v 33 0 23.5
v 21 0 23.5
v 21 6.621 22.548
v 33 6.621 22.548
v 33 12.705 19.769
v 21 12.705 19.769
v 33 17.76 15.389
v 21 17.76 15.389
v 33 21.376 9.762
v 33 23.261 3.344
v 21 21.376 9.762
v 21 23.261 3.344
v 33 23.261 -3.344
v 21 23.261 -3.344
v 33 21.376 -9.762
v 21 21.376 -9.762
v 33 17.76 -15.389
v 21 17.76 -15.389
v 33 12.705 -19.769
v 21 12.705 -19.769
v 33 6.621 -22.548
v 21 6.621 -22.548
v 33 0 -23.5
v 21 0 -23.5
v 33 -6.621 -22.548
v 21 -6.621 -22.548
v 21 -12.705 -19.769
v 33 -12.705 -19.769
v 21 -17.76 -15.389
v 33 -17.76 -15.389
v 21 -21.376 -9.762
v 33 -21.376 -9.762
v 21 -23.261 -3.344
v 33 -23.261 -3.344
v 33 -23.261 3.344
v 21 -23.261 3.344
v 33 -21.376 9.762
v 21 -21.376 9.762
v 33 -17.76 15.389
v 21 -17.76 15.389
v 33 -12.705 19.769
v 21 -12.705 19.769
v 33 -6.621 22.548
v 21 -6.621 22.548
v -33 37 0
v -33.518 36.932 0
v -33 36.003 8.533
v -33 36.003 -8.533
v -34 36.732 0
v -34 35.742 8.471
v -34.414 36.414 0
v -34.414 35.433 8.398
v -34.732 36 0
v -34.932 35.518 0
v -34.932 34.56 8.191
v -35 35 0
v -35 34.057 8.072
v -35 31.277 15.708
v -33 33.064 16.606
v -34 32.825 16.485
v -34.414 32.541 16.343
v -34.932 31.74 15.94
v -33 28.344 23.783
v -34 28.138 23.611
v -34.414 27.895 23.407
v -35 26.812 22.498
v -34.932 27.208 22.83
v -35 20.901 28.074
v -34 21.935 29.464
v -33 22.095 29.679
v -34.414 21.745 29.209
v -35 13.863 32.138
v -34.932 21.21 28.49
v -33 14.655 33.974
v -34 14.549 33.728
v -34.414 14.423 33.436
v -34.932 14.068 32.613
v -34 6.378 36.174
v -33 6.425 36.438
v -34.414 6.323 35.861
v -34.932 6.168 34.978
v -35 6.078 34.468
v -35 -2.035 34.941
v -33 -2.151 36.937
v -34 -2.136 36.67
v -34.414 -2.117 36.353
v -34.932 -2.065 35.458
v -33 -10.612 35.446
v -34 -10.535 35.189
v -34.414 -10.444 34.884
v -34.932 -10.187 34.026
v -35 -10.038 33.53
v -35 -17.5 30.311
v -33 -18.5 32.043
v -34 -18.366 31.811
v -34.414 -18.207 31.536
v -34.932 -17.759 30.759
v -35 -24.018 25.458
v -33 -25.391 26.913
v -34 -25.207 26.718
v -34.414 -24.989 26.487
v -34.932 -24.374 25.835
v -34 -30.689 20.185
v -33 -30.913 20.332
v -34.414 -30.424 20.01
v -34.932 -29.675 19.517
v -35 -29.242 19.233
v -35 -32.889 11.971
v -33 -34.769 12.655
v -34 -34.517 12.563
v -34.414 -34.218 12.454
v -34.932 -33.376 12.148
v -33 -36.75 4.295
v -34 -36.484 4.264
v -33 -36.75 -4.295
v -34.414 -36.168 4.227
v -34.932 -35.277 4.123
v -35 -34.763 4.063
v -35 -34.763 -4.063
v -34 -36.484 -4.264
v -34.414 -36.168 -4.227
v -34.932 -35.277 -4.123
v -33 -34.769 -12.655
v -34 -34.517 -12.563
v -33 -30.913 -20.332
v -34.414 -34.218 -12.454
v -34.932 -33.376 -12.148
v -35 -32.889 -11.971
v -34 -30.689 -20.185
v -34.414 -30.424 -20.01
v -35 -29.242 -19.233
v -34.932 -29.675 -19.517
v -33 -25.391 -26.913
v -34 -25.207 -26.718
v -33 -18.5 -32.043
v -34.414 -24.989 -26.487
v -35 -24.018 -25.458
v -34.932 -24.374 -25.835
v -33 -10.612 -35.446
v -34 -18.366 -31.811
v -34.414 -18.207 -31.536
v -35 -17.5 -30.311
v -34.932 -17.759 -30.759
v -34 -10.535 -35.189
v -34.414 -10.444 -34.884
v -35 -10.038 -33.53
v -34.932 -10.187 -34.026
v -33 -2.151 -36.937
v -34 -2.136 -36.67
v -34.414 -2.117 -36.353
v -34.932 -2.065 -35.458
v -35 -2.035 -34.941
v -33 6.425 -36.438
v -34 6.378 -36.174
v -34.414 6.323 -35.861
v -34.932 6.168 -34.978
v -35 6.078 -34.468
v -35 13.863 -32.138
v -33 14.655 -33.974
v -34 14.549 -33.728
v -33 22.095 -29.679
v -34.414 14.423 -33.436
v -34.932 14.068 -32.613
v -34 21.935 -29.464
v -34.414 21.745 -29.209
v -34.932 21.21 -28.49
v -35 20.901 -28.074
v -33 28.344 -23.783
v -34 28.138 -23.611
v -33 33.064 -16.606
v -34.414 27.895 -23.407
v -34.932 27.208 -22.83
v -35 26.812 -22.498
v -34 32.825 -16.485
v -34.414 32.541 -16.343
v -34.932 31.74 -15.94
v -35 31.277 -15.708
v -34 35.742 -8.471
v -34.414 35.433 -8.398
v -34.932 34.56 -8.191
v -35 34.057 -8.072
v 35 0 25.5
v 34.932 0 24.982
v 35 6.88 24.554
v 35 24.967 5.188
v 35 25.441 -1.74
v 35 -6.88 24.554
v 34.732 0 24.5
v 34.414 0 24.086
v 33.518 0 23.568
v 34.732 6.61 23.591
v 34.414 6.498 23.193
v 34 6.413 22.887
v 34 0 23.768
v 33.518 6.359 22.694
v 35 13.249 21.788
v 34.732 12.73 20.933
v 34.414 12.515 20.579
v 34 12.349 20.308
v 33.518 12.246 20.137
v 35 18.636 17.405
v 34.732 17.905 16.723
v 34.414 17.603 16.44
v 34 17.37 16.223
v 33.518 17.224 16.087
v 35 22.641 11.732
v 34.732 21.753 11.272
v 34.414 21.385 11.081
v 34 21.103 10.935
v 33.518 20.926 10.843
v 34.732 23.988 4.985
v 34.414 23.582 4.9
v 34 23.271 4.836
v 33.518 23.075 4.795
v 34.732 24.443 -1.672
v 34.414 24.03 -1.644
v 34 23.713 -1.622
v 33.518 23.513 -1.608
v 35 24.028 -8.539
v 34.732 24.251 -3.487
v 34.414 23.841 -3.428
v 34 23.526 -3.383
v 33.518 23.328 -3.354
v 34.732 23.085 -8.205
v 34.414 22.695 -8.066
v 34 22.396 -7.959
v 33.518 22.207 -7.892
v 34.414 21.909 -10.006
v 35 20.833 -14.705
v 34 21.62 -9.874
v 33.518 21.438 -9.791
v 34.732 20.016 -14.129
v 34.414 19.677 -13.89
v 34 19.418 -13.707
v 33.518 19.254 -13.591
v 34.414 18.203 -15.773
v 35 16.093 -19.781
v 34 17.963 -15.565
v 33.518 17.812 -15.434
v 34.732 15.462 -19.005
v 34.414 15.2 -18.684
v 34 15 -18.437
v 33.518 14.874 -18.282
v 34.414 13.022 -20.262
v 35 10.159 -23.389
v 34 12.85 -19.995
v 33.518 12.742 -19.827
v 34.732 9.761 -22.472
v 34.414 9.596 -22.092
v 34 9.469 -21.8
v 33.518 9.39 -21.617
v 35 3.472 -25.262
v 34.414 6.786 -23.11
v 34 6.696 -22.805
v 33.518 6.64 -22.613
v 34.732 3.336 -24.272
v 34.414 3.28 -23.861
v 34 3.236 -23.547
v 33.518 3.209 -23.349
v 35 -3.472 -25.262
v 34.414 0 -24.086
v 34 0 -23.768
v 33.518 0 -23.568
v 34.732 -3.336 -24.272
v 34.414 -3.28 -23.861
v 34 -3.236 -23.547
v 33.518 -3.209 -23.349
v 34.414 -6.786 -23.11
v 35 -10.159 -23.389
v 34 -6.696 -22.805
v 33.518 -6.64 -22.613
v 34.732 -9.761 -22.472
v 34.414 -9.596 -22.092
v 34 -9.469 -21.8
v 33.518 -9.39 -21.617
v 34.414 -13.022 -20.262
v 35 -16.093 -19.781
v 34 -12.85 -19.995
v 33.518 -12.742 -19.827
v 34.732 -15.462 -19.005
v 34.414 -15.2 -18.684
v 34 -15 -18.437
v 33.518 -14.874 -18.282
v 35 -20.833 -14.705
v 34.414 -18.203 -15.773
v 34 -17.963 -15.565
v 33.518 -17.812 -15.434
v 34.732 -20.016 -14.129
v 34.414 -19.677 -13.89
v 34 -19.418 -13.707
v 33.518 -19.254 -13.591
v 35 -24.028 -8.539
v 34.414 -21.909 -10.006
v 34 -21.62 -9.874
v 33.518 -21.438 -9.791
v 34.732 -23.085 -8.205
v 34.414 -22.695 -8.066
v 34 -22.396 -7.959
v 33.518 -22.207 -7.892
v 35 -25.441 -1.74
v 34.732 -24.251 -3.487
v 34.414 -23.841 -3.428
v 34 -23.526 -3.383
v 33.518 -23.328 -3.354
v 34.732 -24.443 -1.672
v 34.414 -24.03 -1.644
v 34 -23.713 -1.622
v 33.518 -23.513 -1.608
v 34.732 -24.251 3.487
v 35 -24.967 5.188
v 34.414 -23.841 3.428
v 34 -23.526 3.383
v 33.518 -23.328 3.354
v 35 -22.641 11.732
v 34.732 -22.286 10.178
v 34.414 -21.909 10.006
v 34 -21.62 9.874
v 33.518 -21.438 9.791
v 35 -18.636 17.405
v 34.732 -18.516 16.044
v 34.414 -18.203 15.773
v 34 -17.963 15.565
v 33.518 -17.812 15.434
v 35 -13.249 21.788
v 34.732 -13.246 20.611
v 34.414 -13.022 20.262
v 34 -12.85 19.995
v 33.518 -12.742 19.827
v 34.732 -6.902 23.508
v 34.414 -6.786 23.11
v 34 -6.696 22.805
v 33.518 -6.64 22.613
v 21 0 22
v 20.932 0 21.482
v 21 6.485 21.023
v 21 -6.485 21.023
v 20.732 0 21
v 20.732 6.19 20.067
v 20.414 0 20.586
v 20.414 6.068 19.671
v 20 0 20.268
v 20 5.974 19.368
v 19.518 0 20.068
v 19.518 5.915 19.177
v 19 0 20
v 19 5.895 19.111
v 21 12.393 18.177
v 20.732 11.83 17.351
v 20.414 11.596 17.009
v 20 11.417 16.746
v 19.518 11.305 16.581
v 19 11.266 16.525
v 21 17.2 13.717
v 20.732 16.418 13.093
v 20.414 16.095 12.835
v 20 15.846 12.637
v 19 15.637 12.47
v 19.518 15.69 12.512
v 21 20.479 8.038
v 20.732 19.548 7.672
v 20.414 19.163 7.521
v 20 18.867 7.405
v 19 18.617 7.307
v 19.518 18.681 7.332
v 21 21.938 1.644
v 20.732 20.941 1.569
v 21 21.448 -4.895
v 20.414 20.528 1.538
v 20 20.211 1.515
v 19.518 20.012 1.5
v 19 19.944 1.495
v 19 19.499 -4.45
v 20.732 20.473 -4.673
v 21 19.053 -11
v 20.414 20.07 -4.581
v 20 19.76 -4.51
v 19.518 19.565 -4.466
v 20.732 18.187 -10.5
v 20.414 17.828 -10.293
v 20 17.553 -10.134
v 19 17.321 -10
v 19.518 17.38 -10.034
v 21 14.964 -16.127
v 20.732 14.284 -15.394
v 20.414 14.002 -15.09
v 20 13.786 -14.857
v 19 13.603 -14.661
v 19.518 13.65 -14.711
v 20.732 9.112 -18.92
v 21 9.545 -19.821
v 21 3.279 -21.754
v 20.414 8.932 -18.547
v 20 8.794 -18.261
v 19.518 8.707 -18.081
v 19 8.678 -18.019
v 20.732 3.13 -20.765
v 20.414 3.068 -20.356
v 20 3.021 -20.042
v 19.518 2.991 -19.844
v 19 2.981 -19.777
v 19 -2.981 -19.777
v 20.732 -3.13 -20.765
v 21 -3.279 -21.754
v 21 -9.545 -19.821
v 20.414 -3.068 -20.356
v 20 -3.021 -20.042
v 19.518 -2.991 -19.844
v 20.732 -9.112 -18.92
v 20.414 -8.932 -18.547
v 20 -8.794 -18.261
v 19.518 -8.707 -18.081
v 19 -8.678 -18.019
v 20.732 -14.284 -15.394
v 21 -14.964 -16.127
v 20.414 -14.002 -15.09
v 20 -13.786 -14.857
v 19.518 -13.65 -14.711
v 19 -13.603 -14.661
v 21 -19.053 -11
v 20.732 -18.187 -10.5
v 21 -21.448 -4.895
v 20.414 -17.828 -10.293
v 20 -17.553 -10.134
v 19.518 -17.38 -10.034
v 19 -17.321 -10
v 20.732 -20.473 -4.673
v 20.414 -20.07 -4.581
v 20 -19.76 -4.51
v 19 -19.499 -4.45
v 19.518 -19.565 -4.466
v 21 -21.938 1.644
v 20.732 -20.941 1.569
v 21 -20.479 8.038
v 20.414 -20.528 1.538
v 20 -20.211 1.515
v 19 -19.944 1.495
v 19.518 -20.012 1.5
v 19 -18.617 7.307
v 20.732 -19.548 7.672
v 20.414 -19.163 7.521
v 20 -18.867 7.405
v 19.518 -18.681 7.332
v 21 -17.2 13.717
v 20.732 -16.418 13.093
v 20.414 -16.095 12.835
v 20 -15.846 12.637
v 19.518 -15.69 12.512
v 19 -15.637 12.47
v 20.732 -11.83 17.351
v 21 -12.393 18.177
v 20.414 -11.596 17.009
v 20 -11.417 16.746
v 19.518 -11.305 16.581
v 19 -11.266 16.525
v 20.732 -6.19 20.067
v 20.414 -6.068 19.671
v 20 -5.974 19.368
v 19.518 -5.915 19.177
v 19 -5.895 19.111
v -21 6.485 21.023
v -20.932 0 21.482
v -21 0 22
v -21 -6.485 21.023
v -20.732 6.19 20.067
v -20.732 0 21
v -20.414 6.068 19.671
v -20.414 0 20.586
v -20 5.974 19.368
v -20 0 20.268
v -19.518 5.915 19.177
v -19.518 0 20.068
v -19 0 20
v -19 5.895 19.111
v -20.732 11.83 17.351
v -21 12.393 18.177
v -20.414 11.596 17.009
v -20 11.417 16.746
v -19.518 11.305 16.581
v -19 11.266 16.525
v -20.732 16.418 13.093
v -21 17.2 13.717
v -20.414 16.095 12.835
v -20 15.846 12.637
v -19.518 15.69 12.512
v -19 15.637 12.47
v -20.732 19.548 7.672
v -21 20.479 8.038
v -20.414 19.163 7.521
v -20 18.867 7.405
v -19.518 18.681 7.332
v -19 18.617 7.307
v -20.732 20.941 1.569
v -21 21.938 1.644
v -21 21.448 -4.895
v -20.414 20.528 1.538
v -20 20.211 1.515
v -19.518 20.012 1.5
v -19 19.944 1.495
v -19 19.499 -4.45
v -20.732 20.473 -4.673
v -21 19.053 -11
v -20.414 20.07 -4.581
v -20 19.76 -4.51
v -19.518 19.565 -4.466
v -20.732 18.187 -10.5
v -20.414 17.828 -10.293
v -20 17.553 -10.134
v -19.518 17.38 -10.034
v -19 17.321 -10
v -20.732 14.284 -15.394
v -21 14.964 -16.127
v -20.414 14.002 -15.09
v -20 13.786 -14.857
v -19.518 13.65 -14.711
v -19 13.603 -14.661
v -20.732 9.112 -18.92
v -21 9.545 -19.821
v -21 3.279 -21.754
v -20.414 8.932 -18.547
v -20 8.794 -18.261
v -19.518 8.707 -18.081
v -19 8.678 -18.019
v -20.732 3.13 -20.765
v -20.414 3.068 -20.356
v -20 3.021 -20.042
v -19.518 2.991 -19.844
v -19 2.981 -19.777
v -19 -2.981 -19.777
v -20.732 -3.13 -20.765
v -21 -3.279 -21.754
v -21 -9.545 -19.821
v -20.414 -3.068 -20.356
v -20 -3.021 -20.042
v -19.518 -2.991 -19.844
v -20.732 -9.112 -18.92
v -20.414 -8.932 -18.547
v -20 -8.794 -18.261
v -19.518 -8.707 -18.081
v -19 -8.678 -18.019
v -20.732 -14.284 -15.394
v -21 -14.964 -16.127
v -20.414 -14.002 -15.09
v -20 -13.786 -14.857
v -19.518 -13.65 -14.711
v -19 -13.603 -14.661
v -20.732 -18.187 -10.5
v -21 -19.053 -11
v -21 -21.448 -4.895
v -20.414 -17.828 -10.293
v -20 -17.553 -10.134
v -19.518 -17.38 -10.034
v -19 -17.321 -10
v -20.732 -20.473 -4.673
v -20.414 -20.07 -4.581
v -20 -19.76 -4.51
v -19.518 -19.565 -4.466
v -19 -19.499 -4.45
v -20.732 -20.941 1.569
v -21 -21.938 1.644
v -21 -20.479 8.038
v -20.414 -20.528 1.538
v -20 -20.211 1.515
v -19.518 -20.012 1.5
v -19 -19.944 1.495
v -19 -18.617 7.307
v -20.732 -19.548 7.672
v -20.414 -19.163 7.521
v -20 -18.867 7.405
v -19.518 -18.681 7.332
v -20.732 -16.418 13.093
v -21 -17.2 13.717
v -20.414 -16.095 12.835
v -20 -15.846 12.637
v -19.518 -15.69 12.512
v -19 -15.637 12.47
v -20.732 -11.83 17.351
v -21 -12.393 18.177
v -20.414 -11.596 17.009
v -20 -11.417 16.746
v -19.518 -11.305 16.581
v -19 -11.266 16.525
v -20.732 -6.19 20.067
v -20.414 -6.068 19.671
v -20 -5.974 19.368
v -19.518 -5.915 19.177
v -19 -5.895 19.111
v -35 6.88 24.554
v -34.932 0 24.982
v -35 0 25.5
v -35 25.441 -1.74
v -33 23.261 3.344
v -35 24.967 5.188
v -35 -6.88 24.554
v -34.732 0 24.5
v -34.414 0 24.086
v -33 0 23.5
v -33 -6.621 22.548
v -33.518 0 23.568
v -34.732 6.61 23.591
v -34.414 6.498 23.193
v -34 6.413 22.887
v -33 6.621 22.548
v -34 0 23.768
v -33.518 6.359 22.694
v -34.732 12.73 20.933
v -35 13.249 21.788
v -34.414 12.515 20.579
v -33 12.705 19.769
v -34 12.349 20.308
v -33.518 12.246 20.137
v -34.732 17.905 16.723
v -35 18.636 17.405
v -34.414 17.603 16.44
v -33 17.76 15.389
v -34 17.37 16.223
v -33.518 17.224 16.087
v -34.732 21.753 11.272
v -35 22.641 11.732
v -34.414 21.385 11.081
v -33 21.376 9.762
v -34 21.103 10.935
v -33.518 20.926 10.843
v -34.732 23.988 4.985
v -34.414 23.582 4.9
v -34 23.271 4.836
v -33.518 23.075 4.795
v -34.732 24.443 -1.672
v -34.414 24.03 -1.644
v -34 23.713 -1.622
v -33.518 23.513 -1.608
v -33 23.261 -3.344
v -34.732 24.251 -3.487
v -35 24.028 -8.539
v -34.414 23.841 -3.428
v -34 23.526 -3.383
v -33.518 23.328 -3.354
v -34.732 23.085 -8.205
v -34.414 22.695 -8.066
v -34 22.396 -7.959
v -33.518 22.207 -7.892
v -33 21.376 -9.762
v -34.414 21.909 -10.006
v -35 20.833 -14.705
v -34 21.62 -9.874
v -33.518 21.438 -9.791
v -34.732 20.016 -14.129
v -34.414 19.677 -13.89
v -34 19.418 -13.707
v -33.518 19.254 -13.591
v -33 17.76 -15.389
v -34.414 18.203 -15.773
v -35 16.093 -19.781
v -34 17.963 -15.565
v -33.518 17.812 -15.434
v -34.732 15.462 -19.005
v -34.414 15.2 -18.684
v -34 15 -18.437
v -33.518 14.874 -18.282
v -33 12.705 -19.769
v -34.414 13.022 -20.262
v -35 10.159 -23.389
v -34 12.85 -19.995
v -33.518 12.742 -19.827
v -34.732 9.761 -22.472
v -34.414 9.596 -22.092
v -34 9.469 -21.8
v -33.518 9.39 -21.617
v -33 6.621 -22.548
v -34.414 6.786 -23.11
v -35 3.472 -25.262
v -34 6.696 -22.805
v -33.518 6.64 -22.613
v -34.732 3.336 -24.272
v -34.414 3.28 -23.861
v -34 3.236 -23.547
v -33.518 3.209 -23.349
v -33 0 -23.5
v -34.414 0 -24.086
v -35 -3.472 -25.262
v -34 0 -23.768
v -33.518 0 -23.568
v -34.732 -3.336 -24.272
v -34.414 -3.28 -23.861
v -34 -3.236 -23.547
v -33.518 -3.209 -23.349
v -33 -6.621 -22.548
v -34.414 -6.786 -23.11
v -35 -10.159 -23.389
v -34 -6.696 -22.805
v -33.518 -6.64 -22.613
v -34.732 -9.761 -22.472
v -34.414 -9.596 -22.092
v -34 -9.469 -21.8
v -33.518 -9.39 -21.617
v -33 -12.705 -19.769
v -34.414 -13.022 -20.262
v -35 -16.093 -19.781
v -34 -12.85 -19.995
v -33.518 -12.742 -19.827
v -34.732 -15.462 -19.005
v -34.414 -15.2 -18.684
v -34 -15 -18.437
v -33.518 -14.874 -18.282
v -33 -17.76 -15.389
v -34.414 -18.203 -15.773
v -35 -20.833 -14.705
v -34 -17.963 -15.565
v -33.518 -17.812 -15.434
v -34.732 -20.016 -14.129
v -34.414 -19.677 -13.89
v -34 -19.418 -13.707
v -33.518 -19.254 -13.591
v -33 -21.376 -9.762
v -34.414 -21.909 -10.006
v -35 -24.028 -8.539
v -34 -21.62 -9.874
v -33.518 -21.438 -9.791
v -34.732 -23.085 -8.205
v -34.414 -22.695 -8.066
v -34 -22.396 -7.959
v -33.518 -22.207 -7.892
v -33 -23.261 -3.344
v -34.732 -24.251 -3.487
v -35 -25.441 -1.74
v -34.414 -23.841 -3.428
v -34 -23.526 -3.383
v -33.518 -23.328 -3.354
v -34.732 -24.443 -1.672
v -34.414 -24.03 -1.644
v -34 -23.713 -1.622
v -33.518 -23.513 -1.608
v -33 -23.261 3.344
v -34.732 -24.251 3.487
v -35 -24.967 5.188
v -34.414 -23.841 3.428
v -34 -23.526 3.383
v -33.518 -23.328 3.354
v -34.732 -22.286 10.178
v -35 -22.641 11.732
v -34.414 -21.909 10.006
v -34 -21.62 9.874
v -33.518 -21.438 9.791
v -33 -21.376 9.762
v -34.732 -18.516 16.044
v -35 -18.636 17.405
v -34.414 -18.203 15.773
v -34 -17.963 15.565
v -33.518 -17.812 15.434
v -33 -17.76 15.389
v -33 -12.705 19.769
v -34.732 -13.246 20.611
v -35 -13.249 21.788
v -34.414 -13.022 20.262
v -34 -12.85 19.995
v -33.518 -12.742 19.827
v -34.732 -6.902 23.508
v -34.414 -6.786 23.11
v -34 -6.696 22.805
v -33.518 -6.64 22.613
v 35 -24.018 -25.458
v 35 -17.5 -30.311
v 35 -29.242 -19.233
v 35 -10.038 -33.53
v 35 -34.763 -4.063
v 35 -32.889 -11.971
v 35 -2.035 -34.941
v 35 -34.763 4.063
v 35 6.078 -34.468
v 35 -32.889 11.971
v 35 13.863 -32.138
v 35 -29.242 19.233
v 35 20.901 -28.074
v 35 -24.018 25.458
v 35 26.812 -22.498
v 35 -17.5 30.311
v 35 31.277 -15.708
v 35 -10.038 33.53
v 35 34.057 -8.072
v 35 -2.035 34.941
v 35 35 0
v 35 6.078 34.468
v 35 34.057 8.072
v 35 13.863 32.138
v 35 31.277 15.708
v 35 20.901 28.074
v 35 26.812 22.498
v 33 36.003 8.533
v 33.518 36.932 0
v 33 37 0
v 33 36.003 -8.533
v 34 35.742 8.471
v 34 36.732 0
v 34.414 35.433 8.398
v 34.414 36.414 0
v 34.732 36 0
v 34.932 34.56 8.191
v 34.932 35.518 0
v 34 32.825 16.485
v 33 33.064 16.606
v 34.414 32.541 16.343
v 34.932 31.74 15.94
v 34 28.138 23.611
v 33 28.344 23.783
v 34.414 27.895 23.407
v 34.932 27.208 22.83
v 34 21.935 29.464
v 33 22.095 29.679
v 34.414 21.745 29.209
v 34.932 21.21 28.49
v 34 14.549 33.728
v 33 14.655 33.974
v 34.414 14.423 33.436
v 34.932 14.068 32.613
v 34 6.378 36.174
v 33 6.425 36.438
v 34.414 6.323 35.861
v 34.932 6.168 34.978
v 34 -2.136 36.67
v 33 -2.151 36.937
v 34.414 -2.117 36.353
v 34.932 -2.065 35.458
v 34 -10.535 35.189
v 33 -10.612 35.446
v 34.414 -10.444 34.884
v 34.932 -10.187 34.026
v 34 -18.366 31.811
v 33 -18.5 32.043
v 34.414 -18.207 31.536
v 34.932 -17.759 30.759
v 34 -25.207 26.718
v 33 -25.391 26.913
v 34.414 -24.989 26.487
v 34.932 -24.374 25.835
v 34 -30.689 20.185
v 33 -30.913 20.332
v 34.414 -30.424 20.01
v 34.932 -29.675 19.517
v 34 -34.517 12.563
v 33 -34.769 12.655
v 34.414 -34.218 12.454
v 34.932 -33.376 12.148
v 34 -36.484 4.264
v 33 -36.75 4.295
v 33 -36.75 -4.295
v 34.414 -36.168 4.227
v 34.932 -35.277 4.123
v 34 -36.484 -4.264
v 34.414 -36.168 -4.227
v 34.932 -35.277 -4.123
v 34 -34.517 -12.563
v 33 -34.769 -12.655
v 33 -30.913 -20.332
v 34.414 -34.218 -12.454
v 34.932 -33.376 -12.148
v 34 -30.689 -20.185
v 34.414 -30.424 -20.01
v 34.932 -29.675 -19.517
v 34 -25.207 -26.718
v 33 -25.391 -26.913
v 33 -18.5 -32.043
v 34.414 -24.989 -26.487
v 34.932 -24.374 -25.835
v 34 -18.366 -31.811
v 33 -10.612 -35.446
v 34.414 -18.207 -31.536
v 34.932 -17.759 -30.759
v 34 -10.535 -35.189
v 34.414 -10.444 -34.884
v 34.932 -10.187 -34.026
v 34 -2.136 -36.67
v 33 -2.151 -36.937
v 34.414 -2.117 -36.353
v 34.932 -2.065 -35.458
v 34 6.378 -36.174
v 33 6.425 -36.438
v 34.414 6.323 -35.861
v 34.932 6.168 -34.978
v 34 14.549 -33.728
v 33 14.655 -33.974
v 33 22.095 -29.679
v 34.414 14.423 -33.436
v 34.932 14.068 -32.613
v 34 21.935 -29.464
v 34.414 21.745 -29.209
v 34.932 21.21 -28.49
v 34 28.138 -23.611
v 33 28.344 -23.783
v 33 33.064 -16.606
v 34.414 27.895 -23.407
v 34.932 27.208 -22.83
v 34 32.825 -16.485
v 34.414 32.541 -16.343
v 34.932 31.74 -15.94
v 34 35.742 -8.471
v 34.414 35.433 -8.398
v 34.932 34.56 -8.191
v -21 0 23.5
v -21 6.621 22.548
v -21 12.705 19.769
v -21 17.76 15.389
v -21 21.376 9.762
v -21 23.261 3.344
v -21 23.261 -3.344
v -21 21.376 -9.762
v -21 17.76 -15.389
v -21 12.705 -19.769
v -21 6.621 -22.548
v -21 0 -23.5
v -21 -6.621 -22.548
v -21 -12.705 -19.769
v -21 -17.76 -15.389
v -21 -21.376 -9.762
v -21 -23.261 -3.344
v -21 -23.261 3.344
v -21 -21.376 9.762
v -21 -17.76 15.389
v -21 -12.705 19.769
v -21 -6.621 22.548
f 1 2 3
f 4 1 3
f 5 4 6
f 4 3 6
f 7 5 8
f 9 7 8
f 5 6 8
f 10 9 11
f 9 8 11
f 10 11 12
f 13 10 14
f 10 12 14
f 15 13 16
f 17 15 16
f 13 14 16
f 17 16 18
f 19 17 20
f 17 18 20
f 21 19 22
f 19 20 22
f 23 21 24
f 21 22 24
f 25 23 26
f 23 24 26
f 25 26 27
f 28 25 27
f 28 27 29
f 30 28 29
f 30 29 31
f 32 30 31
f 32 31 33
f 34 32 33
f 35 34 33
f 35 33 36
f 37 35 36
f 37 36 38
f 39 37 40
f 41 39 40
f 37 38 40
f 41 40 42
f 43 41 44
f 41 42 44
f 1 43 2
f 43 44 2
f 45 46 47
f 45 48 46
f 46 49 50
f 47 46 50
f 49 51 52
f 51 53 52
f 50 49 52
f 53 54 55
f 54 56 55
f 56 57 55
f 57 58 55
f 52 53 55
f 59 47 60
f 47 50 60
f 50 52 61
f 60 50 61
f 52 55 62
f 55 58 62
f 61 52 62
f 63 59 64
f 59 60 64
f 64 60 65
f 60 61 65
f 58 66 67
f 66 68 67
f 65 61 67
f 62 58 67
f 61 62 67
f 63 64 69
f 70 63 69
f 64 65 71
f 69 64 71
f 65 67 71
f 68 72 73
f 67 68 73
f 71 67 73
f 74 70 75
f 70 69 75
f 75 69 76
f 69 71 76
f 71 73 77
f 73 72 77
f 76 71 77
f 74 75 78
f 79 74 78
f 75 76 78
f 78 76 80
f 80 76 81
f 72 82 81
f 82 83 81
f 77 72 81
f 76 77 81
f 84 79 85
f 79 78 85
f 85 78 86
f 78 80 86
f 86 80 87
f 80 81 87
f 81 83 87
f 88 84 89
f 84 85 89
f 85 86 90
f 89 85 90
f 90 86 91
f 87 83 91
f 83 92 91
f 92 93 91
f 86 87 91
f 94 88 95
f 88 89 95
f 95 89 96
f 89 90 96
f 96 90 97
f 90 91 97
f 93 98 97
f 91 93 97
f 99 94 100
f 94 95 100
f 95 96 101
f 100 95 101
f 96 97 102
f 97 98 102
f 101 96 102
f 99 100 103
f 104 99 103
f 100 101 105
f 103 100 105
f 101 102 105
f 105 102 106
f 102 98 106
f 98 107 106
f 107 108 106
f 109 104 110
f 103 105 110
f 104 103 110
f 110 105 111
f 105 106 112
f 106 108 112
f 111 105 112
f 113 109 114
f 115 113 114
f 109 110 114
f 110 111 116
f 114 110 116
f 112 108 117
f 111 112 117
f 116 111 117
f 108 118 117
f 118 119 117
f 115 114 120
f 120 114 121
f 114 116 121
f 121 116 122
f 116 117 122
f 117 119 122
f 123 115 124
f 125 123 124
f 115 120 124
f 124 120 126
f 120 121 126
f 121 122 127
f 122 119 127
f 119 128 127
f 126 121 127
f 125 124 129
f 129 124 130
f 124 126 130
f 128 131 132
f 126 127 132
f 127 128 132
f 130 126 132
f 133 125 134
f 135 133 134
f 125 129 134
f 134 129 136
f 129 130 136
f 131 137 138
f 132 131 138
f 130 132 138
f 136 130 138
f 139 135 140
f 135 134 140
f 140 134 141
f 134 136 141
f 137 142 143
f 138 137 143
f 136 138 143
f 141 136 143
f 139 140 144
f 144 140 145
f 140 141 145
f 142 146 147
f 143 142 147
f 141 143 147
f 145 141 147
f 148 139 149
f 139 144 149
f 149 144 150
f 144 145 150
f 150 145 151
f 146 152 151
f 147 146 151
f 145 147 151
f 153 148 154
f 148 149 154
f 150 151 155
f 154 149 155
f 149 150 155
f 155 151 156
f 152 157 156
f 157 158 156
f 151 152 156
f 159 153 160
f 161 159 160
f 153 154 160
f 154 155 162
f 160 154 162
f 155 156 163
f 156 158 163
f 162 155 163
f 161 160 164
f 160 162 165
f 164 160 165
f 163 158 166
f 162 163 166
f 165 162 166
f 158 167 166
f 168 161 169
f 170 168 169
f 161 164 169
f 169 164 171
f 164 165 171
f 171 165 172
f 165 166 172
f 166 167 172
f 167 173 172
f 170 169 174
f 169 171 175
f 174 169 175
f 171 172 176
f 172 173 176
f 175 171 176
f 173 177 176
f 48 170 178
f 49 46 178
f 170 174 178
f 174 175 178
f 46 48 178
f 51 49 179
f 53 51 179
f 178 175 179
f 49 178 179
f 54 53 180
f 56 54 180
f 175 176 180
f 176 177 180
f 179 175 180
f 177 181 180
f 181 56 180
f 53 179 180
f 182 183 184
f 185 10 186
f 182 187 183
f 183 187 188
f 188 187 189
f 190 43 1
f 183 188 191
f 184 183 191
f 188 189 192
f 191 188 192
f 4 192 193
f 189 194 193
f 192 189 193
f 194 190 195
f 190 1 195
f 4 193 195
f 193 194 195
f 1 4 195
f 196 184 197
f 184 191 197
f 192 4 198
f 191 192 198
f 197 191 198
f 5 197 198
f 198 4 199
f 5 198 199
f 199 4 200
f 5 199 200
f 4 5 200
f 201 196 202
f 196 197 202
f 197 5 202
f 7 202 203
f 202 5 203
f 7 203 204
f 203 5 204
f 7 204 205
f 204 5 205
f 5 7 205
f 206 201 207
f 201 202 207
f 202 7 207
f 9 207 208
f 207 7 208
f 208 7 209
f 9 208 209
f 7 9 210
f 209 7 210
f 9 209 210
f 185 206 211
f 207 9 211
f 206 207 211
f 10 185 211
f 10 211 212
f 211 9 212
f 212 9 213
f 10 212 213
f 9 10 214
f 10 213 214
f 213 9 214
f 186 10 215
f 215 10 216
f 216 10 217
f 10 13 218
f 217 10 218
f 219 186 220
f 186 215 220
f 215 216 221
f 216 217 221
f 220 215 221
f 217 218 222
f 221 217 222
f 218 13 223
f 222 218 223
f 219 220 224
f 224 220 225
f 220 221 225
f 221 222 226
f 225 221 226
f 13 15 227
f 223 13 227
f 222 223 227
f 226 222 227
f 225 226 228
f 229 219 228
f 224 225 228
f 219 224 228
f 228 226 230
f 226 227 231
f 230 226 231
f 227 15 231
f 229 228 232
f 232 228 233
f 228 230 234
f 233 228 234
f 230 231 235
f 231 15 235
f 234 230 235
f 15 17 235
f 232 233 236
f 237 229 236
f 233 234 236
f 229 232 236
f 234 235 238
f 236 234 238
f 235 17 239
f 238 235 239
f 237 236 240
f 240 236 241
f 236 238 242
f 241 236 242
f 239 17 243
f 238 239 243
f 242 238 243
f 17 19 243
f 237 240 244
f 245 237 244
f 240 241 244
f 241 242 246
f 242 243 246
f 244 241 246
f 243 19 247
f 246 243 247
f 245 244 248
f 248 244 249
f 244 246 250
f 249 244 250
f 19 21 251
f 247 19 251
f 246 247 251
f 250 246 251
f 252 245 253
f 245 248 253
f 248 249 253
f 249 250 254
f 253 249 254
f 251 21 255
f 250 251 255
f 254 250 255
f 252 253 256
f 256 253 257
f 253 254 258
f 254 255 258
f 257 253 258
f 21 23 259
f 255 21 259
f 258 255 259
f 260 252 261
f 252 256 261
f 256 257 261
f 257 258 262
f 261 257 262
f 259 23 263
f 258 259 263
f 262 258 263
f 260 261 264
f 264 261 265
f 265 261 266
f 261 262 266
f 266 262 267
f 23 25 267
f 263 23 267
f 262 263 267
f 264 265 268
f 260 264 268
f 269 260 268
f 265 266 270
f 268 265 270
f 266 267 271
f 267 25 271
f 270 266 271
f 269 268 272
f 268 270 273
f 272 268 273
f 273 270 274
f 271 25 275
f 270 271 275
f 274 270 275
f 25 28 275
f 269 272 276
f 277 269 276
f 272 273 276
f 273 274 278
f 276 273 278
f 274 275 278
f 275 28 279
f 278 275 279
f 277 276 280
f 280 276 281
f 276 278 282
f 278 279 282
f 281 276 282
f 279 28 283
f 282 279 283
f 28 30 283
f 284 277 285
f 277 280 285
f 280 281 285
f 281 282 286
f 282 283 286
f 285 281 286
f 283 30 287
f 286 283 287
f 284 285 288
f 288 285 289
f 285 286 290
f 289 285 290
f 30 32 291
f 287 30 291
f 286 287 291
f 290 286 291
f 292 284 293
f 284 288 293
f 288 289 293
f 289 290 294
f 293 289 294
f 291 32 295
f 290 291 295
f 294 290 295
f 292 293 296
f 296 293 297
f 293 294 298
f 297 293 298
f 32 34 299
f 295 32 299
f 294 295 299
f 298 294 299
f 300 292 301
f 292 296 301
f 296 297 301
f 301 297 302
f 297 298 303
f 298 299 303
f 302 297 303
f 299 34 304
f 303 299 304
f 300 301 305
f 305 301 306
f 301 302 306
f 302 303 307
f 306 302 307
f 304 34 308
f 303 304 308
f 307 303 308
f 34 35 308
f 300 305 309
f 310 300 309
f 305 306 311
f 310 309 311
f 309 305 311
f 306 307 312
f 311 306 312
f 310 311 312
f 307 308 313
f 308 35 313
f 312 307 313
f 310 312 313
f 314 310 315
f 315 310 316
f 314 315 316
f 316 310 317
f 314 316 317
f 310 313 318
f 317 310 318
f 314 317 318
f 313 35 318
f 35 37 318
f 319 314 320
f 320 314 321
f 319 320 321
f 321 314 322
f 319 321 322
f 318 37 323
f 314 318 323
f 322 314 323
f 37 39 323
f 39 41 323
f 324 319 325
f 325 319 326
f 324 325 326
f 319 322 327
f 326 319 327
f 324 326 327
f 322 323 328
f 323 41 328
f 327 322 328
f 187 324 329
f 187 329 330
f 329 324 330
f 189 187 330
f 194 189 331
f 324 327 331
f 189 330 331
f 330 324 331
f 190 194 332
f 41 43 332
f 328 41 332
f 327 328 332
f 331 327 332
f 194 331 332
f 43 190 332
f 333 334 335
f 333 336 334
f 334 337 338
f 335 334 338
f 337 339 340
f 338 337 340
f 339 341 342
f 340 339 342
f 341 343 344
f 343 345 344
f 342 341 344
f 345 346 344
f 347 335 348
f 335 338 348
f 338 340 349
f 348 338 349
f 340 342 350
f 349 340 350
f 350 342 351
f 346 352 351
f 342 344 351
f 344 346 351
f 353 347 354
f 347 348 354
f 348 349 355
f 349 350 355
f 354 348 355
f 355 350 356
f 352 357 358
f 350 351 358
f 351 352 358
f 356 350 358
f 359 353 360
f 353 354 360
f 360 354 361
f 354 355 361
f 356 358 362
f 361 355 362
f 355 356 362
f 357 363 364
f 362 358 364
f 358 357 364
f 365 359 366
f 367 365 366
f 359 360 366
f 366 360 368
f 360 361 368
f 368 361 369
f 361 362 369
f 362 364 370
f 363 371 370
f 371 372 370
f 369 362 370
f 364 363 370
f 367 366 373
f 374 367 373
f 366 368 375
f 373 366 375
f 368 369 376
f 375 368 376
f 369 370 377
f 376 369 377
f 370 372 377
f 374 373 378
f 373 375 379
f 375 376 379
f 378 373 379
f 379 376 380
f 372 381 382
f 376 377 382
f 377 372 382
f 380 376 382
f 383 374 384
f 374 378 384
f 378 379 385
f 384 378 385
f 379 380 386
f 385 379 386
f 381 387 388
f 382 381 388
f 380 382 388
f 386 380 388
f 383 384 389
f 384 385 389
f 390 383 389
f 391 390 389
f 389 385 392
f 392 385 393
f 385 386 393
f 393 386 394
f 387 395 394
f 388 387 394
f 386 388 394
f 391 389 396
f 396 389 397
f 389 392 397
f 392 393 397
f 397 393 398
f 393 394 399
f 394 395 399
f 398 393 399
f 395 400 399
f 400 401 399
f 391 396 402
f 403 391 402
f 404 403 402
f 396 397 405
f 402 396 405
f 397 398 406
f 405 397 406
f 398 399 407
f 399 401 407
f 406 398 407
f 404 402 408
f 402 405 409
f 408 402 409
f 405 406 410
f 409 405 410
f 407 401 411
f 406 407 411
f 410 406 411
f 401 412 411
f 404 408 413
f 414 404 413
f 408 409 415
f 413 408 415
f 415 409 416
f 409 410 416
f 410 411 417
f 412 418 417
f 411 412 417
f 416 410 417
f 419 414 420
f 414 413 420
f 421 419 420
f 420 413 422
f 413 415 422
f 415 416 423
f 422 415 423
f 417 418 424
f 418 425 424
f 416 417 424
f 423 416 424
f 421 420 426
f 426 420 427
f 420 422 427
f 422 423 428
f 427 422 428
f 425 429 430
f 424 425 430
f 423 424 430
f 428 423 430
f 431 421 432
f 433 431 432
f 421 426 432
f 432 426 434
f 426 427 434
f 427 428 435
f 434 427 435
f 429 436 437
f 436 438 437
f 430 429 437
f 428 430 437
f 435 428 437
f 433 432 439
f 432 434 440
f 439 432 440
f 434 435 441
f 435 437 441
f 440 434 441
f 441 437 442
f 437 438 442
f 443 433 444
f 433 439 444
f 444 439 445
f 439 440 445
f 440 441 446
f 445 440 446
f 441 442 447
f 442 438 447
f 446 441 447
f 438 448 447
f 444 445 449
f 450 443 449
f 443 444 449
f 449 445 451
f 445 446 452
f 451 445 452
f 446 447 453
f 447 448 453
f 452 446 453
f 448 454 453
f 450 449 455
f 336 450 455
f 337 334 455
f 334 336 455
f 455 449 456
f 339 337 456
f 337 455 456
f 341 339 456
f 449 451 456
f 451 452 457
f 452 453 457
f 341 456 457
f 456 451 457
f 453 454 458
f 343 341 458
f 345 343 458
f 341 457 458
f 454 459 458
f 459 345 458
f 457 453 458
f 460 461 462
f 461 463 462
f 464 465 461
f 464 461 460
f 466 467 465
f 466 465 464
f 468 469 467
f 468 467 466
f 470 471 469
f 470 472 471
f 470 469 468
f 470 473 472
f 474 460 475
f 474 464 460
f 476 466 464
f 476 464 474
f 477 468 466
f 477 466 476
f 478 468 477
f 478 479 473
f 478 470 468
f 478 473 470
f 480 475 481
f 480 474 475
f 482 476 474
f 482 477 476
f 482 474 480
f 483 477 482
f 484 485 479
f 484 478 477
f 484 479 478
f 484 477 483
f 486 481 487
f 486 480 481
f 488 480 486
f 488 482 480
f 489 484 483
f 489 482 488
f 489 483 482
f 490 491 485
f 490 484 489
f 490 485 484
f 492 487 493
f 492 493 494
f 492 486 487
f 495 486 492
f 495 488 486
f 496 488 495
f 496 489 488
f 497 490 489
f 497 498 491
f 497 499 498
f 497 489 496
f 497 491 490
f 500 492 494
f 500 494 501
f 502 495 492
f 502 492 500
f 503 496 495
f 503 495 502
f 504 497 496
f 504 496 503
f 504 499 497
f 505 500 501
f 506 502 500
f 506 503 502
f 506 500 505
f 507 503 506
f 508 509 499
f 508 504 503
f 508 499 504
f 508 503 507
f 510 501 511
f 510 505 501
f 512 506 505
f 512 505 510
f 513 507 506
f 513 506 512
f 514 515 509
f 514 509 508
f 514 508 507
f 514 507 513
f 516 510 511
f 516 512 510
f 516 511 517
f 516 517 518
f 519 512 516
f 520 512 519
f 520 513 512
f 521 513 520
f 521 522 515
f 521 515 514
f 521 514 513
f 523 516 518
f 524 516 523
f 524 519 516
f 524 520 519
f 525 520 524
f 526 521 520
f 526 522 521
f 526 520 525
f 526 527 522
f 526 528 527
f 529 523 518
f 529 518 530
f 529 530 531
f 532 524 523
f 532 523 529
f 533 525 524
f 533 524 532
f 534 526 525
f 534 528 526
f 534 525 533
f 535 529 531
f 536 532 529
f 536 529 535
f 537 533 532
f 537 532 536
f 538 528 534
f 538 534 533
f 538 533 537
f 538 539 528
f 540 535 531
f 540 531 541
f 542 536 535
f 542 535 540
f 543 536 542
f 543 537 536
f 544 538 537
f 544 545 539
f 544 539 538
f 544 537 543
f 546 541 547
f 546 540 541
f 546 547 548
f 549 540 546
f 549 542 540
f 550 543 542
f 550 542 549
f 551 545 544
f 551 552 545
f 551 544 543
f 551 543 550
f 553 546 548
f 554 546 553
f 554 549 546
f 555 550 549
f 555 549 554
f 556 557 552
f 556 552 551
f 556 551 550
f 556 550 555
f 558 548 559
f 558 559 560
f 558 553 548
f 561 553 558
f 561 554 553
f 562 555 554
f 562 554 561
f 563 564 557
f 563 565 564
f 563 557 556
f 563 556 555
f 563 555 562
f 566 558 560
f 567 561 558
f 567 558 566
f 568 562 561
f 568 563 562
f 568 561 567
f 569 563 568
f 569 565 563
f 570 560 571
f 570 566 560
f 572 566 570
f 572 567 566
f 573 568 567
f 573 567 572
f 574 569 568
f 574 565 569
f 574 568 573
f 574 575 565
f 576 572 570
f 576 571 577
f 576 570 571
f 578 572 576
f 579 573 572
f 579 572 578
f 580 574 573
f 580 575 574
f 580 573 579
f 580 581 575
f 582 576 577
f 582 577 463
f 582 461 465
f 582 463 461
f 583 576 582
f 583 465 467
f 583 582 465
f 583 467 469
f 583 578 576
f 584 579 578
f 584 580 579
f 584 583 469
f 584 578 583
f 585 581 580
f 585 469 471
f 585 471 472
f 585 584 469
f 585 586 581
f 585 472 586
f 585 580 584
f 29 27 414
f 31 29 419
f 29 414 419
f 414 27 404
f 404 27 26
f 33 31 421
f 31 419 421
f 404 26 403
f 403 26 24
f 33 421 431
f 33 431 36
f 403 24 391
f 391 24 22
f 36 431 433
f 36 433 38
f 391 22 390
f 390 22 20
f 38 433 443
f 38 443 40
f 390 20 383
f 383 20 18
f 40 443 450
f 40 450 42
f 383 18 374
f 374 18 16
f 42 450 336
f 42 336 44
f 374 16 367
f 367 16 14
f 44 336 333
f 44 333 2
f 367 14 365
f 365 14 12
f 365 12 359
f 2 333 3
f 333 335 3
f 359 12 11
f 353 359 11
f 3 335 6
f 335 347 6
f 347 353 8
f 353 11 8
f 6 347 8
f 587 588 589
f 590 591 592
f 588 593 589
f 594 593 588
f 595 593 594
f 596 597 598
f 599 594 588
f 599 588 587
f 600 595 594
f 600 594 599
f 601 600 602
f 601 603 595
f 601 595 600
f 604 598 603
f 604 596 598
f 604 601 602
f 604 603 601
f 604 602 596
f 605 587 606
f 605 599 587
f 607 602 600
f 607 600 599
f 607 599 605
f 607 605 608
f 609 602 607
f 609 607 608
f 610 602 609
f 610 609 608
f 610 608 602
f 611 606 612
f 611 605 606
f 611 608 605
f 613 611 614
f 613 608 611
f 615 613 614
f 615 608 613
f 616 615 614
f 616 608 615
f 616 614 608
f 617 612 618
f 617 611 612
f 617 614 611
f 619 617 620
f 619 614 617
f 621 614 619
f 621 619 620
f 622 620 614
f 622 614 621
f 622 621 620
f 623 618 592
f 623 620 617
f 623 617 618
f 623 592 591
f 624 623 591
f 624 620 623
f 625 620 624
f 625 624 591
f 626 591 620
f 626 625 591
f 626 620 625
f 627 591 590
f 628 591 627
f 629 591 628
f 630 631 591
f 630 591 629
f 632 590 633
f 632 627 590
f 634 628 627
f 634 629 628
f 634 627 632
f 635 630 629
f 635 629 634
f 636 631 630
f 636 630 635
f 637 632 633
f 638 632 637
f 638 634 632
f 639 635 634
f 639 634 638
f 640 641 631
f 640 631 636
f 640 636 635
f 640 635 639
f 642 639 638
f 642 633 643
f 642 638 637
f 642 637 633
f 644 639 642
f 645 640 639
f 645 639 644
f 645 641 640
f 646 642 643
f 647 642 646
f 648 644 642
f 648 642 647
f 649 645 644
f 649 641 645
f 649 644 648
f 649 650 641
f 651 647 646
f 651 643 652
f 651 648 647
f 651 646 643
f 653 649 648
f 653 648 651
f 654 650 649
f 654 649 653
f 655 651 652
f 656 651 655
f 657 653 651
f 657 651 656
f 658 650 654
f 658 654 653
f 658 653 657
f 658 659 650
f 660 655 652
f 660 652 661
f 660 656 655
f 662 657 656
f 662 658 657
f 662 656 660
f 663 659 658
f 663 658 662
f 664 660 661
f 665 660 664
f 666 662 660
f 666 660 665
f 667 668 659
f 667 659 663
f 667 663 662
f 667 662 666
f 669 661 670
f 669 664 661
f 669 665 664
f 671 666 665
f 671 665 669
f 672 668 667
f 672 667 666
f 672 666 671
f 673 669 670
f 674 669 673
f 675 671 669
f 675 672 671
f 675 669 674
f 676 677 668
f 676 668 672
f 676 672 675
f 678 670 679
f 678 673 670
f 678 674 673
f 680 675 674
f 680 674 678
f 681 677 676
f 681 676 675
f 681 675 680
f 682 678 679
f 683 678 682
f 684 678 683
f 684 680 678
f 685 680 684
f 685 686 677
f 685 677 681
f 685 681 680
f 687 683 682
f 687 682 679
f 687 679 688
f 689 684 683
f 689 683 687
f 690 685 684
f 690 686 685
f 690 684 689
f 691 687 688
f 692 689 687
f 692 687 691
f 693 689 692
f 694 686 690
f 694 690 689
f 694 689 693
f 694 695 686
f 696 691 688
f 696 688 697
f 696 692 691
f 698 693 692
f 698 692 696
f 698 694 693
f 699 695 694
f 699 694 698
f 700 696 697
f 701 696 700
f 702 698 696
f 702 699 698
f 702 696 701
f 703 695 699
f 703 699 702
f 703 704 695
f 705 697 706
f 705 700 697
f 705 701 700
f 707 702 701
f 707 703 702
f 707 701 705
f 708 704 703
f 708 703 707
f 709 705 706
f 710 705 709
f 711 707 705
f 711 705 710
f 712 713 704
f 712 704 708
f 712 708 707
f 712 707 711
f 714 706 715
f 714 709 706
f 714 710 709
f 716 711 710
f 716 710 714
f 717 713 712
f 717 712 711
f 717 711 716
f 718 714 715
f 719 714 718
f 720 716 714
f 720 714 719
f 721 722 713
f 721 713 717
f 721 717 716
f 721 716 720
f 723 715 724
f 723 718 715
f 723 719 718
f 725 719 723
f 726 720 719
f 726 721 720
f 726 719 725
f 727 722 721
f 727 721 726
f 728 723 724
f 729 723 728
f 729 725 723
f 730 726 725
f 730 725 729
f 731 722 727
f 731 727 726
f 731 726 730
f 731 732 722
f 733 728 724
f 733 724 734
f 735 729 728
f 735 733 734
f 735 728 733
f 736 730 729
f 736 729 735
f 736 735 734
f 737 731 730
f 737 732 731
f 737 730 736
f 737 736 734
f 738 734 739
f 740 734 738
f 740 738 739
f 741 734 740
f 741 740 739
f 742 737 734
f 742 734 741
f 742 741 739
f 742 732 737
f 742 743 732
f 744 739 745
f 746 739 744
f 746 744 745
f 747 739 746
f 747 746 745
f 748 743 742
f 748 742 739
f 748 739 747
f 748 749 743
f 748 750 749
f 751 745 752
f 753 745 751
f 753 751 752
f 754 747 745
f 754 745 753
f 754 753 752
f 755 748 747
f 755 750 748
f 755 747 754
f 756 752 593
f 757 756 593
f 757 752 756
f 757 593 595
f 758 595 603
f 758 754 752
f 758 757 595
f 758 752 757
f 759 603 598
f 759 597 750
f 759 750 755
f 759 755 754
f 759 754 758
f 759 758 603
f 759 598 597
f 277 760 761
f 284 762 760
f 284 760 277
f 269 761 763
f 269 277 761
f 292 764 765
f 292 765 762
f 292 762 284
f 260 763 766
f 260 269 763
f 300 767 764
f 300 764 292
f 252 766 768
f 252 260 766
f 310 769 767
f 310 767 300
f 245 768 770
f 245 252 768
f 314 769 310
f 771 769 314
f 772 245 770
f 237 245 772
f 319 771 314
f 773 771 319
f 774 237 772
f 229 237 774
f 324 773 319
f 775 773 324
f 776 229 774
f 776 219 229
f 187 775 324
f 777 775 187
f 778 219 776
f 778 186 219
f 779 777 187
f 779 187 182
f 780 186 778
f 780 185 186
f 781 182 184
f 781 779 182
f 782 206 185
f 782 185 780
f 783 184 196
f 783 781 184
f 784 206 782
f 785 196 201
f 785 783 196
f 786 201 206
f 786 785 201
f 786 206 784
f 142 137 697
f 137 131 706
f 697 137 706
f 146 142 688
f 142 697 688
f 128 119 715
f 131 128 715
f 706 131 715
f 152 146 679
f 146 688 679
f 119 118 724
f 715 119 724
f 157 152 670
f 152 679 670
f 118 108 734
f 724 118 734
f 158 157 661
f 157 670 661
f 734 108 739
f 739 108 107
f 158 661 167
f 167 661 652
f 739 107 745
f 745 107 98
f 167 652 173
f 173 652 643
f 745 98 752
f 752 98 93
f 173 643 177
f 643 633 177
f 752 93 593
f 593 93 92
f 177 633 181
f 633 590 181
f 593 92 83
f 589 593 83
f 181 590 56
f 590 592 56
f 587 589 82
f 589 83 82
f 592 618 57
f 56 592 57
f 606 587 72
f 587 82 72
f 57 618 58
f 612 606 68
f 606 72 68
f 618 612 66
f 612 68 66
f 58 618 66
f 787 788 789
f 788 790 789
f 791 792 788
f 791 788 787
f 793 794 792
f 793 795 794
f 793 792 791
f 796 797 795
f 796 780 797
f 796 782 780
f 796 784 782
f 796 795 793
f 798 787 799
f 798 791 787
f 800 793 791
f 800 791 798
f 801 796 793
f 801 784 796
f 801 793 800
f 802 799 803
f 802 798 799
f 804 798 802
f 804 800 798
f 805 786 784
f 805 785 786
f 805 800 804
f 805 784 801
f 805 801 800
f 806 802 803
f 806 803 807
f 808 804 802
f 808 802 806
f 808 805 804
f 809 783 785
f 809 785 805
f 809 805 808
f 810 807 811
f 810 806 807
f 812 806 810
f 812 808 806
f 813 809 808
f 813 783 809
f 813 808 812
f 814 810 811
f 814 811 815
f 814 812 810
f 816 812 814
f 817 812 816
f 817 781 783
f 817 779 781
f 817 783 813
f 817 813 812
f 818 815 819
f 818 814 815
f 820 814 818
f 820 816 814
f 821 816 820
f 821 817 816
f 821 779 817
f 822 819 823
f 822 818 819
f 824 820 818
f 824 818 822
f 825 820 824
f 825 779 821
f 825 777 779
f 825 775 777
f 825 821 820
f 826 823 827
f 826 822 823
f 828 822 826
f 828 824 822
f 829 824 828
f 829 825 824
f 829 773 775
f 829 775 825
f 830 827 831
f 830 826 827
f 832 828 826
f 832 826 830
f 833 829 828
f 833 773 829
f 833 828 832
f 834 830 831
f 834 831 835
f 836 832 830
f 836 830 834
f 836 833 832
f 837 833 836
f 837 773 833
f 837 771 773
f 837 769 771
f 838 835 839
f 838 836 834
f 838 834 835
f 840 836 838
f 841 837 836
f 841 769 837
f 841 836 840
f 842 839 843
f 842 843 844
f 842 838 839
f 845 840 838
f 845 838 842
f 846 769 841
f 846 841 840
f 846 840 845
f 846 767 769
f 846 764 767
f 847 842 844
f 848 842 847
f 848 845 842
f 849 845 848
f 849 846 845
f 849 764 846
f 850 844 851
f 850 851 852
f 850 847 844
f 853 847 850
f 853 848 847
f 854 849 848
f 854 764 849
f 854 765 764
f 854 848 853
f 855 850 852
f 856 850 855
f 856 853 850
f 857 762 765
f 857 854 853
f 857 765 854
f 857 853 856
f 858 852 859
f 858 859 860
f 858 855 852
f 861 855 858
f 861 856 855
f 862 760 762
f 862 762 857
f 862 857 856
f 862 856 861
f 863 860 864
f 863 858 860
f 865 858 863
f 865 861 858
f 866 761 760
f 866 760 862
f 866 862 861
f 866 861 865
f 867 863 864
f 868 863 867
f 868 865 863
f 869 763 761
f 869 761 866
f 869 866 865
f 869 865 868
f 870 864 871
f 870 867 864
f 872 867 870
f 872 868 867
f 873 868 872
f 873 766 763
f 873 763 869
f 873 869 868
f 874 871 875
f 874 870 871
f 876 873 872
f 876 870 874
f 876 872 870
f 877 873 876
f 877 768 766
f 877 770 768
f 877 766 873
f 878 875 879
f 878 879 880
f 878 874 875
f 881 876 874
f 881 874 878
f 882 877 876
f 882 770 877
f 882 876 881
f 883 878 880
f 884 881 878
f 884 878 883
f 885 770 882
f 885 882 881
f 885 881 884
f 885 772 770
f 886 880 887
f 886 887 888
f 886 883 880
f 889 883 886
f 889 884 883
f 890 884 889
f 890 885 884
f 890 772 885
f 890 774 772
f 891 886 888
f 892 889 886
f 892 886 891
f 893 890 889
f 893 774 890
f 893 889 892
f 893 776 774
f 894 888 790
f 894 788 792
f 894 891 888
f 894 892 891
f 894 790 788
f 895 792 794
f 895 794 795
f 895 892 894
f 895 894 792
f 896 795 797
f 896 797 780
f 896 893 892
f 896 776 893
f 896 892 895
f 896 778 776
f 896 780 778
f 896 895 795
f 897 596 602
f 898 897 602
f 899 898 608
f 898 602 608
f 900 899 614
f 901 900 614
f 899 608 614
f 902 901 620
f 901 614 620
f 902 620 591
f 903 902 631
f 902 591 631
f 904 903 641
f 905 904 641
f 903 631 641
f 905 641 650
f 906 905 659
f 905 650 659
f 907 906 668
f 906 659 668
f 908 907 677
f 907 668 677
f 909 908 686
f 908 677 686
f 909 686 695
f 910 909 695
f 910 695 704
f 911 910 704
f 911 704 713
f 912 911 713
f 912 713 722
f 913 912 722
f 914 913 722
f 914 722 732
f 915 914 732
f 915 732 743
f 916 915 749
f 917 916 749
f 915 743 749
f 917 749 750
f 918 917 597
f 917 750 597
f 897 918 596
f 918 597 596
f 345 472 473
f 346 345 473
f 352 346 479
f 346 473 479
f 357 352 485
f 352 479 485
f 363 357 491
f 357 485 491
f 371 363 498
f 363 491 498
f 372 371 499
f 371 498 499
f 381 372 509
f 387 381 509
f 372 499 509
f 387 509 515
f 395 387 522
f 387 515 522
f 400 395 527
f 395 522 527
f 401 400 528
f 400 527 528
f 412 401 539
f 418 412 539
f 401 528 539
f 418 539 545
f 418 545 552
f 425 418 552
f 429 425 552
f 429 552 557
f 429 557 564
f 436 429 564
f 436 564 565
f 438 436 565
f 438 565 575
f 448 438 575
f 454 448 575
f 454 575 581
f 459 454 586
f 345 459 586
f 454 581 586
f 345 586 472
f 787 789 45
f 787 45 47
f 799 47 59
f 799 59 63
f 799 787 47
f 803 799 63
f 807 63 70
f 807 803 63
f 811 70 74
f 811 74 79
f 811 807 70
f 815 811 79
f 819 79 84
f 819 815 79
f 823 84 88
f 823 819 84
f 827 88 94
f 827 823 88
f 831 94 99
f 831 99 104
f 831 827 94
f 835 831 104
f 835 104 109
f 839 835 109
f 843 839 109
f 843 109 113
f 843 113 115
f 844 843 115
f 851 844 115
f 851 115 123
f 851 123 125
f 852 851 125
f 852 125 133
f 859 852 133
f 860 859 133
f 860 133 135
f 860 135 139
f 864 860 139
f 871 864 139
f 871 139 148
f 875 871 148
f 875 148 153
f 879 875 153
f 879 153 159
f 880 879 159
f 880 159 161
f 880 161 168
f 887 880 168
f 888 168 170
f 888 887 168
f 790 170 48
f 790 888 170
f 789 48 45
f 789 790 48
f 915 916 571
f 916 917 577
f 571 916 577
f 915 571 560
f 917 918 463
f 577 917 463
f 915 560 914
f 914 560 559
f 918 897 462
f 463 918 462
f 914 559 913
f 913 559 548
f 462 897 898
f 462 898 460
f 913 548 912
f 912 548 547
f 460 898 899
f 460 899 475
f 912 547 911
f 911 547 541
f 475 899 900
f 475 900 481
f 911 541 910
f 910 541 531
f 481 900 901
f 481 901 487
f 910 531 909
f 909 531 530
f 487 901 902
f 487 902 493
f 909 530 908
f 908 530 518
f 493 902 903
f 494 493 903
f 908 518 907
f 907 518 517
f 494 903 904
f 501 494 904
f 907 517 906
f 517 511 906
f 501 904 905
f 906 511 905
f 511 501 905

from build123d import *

# Parameters (mm, degrees)
F0_R     = 37
F1_DEPTH = 35
F4_R     = 2


with BuildPart() as f1:
    # F0 (on Right) → F1 (new body, symmetric)
    with BuildSketch(Plane.YZ):
        Circle(F0_R)
    extrude(amount=F1_DEPTH, both=True)

    # F2 (on Front) → F3 (revolve, cut)
    with BuildSketch(Plane.XZ):
        Polygon((21, 20), (0, 20), (-21, 20), (-21, 23.5), (-35, 23.5), (-35, 0), (0, 0), (35, 0), (35, 23.5), (21, 23.5), align=None)
    revolve(axis=Axis((17.5, 0, 0), (-1, 0, 0)), mode=Mode.SUBTRACT)

    # F4
    f4_edges = [f1.edges().sort_by_distance(p)[0] for p in [
        (-35, -37, 0),
        (0, 37, 0),
        (35, -37, 0),
        (35, 0, -23.5),
        (-35, 0, -23.5),
        (-21, 0, -20),
        (21, 0, -20),
    ]]
    fillet(f4_edges, radius=F4_R)


solid = f1.part
